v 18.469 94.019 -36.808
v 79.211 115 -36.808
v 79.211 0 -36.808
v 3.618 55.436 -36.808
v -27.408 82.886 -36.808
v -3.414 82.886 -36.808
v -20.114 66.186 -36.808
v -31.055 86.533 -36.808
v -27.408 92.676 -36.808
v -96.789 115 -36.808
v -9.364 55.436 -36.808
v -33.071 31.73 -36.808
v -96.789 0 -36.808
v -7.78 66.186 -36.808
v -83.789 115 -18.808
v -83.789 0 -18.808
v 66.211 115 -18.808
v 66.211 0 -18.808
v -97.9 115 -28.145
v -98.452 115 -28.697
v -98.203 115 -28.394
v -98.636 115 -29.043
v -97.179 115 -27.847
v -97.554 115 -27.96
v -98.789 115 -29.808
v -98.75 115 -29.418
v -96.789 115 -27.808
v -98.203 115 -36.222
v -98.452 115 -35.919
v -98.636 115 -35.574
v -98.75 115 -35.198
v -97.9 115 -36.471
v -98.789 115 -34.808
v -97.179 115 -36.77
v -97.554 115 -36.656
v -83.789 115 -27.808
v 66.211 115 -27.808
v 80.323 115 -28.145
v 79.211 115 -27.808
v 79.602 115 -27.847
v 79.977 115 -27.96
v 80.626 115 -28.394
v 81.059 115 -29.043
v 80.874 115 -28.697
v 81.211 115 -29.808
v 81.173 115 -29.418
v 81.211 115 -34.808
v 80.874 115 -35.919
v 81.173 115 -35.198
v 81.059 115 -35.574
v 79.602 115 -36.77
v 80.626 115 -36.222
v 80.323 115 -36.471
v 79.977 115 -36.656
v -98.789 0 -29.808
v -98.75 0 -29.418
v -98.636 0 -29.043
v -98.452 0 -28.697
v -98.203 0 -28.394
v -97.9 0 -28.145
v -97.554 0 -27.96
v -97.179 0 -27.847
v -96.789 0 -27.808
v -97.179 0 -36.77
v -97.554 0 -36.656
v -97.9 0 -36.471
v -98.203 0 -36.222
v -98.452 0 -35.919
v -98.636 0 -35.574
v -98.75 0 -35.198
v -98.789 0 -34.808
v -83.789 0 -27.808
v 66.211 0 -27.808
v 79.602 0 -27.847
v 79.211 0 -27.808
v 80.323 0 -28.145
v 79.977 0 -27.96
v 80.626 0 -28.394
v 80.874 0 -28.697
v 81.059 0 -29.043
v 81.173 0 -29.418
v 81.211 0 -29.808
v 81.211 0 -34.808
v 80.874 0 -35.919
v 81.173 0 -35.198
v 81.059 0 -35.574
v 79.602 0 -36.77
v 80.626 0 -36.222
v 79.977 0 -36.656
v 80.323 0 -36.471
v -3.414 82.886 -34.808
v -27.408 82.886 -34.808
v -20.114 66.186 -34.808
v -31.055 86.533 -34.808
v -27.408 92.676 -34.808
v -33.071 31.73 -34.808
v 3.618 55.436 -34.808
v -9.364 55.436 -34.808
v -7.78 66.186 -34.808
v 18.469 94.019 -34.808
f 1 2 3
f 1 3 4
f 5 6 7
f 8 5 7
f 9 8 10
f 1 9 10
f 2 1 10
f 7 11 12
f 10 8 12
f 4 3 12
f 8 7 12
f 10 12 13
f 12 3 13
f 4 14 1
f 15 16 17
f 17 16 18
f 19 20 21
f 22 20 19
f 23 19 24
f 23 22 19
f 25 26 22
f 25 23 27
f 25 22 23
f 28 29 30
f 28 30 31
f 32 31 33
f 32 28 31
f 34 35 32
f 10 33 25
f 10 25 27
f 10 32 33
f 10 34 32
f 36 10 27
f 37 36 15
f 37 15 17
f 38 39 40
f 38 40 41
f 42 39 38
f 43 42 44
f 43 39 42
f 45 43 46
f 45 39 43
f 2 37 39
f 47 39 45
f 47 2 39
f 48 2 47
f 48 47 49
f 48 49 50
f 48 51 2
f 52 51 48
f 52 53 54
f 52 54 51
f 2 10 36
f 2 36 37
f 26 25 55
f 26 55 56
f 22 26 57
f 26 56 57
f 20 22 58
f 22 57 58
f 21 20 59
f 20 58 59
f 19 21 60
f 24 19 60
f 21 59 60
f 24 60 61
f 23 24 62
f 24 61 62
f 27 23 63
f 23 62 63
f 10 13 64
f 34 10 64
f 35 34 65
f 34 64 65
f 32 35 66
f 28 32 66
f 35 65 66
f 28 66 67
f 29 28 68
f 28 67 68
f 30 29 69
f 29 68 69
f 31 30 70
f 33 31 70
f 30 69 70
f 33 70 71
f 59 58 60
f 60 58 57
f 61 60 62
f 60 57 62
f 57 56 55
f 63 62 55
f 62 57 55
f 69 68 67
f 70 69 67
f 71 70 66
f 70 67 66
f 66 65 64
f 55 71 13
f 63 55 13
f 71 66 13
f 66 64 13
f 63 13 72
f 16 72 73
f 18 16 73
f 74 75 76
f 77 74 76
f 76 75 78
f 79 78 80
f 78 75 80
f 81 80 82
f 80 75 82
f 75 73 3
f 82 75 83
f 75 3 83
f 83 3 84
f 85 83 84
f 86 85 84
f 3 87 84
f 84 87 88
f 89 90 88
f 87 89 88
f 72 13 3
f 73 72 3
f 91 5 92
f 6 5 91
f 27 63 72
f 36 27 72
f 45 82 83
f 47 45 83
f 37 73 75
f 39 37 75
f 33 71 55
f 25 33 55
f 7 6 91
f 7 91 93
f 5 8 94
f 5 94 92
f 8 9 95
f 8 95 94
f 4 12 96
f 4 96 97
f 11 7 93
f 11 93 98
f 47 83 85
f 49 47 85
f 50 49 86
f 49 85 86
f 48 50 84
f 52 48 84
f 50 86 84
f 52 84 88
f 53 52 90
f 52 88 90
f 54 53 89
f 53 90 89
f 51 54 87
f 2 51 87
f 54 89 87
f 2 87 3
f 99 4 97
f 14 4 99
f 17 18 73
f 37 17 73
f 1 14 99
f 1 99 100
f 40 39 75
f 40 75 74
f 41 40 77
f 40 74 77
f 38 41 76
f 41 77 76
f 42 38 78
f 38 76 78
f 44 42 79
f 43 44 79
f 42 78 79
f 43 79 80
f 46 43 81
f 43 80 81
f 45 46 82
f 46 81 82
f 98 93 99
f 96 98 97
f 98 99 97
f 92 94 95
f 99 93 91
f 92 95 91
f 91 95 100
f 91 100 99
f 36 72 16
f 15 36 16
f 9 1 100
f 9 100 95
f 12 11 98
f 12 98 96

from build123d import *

# Parameters (mm, degrees)
BOSS_EXTRUDE2_DEPTH = 115
CUT_EXTRUDE1_DEPTH  = 2


with BuildPart() as part:
    # Sketch1 → Boss-Extrude2 (new body)
    with BuildSketch(Plane(origin=(0, 0, 0), x_dir=(1, 0, 0), z_dir=(0, 1, 0))):
        with BuildLine():
            Line((-98.788631121, 34.808160187), (-98.788631121, 29.808160187))
            ThreePointArc((-98.788631121, 29.808160187), (-98.202844683, 28.393946625), (-96.788631121, 27.808160187))
            Line((-96.788631121, 27.808160187), (-83.788631121, 27.808160187))
            Line((-83.788631121, 27.808160187), (-83.788631121, 18.808160187))
            Line((-83.788631121, 18.808160187), (66.211368879, 18.808160187))
            Line((66.211368879, 18.808160187), (66.211368879, 27.808160187))
            Line((66.211368879, 27.808160187), (79.211368879, 27.808160187))
            ThreePointArc((79.211368879, 27.808160187), (80.625582441, 28.393946625), (81.211368879, 29.808160187))
            Line((81.211368879, 29.808160187), (81.211368879, 34.808160187))
            ThreePointArc((81.211368879, 34.808160187), (80.625582441, 36.222373749), (79.211368879, 36.808160187))
            Line((79.211368879, 36.808160187), (-96.788631121, 36.808160187))
            ThreePointArc((-96.788631121, 36.808160187), (-98.202844683, 36.222373749), (-98.788631121, 34.808160187))
        make_face()
    extrude(amount=BOSS_EXTRUDE2_DEPTH)

    # Sketch2 → Cut-Extrude1 (cut)
    with BuildSketch(Plane(origin=(0, 0, -36.808160187), x_dir=(-1, 0, 0), z_dir=(0, 0, -1))):
        Polygon((27.408337163, 82.886030919), (3.413870614, 82.886030919), (20.114019332, 66.1858822), (9.364498318, 55.436361186), (33.071031269, 31.729828236), (-3.617725634, 55.436361186), (7.780473372, 66.1858822), (-18.469082879, 94.019463397), (27.408337163, 92.675773271), (31.055496079, 86.533189834), align=None)
    extrude(amount=-CUT_EXTRUDE1_DEPTH, mode=Mode.SUBTRACT)


solid = part.part
